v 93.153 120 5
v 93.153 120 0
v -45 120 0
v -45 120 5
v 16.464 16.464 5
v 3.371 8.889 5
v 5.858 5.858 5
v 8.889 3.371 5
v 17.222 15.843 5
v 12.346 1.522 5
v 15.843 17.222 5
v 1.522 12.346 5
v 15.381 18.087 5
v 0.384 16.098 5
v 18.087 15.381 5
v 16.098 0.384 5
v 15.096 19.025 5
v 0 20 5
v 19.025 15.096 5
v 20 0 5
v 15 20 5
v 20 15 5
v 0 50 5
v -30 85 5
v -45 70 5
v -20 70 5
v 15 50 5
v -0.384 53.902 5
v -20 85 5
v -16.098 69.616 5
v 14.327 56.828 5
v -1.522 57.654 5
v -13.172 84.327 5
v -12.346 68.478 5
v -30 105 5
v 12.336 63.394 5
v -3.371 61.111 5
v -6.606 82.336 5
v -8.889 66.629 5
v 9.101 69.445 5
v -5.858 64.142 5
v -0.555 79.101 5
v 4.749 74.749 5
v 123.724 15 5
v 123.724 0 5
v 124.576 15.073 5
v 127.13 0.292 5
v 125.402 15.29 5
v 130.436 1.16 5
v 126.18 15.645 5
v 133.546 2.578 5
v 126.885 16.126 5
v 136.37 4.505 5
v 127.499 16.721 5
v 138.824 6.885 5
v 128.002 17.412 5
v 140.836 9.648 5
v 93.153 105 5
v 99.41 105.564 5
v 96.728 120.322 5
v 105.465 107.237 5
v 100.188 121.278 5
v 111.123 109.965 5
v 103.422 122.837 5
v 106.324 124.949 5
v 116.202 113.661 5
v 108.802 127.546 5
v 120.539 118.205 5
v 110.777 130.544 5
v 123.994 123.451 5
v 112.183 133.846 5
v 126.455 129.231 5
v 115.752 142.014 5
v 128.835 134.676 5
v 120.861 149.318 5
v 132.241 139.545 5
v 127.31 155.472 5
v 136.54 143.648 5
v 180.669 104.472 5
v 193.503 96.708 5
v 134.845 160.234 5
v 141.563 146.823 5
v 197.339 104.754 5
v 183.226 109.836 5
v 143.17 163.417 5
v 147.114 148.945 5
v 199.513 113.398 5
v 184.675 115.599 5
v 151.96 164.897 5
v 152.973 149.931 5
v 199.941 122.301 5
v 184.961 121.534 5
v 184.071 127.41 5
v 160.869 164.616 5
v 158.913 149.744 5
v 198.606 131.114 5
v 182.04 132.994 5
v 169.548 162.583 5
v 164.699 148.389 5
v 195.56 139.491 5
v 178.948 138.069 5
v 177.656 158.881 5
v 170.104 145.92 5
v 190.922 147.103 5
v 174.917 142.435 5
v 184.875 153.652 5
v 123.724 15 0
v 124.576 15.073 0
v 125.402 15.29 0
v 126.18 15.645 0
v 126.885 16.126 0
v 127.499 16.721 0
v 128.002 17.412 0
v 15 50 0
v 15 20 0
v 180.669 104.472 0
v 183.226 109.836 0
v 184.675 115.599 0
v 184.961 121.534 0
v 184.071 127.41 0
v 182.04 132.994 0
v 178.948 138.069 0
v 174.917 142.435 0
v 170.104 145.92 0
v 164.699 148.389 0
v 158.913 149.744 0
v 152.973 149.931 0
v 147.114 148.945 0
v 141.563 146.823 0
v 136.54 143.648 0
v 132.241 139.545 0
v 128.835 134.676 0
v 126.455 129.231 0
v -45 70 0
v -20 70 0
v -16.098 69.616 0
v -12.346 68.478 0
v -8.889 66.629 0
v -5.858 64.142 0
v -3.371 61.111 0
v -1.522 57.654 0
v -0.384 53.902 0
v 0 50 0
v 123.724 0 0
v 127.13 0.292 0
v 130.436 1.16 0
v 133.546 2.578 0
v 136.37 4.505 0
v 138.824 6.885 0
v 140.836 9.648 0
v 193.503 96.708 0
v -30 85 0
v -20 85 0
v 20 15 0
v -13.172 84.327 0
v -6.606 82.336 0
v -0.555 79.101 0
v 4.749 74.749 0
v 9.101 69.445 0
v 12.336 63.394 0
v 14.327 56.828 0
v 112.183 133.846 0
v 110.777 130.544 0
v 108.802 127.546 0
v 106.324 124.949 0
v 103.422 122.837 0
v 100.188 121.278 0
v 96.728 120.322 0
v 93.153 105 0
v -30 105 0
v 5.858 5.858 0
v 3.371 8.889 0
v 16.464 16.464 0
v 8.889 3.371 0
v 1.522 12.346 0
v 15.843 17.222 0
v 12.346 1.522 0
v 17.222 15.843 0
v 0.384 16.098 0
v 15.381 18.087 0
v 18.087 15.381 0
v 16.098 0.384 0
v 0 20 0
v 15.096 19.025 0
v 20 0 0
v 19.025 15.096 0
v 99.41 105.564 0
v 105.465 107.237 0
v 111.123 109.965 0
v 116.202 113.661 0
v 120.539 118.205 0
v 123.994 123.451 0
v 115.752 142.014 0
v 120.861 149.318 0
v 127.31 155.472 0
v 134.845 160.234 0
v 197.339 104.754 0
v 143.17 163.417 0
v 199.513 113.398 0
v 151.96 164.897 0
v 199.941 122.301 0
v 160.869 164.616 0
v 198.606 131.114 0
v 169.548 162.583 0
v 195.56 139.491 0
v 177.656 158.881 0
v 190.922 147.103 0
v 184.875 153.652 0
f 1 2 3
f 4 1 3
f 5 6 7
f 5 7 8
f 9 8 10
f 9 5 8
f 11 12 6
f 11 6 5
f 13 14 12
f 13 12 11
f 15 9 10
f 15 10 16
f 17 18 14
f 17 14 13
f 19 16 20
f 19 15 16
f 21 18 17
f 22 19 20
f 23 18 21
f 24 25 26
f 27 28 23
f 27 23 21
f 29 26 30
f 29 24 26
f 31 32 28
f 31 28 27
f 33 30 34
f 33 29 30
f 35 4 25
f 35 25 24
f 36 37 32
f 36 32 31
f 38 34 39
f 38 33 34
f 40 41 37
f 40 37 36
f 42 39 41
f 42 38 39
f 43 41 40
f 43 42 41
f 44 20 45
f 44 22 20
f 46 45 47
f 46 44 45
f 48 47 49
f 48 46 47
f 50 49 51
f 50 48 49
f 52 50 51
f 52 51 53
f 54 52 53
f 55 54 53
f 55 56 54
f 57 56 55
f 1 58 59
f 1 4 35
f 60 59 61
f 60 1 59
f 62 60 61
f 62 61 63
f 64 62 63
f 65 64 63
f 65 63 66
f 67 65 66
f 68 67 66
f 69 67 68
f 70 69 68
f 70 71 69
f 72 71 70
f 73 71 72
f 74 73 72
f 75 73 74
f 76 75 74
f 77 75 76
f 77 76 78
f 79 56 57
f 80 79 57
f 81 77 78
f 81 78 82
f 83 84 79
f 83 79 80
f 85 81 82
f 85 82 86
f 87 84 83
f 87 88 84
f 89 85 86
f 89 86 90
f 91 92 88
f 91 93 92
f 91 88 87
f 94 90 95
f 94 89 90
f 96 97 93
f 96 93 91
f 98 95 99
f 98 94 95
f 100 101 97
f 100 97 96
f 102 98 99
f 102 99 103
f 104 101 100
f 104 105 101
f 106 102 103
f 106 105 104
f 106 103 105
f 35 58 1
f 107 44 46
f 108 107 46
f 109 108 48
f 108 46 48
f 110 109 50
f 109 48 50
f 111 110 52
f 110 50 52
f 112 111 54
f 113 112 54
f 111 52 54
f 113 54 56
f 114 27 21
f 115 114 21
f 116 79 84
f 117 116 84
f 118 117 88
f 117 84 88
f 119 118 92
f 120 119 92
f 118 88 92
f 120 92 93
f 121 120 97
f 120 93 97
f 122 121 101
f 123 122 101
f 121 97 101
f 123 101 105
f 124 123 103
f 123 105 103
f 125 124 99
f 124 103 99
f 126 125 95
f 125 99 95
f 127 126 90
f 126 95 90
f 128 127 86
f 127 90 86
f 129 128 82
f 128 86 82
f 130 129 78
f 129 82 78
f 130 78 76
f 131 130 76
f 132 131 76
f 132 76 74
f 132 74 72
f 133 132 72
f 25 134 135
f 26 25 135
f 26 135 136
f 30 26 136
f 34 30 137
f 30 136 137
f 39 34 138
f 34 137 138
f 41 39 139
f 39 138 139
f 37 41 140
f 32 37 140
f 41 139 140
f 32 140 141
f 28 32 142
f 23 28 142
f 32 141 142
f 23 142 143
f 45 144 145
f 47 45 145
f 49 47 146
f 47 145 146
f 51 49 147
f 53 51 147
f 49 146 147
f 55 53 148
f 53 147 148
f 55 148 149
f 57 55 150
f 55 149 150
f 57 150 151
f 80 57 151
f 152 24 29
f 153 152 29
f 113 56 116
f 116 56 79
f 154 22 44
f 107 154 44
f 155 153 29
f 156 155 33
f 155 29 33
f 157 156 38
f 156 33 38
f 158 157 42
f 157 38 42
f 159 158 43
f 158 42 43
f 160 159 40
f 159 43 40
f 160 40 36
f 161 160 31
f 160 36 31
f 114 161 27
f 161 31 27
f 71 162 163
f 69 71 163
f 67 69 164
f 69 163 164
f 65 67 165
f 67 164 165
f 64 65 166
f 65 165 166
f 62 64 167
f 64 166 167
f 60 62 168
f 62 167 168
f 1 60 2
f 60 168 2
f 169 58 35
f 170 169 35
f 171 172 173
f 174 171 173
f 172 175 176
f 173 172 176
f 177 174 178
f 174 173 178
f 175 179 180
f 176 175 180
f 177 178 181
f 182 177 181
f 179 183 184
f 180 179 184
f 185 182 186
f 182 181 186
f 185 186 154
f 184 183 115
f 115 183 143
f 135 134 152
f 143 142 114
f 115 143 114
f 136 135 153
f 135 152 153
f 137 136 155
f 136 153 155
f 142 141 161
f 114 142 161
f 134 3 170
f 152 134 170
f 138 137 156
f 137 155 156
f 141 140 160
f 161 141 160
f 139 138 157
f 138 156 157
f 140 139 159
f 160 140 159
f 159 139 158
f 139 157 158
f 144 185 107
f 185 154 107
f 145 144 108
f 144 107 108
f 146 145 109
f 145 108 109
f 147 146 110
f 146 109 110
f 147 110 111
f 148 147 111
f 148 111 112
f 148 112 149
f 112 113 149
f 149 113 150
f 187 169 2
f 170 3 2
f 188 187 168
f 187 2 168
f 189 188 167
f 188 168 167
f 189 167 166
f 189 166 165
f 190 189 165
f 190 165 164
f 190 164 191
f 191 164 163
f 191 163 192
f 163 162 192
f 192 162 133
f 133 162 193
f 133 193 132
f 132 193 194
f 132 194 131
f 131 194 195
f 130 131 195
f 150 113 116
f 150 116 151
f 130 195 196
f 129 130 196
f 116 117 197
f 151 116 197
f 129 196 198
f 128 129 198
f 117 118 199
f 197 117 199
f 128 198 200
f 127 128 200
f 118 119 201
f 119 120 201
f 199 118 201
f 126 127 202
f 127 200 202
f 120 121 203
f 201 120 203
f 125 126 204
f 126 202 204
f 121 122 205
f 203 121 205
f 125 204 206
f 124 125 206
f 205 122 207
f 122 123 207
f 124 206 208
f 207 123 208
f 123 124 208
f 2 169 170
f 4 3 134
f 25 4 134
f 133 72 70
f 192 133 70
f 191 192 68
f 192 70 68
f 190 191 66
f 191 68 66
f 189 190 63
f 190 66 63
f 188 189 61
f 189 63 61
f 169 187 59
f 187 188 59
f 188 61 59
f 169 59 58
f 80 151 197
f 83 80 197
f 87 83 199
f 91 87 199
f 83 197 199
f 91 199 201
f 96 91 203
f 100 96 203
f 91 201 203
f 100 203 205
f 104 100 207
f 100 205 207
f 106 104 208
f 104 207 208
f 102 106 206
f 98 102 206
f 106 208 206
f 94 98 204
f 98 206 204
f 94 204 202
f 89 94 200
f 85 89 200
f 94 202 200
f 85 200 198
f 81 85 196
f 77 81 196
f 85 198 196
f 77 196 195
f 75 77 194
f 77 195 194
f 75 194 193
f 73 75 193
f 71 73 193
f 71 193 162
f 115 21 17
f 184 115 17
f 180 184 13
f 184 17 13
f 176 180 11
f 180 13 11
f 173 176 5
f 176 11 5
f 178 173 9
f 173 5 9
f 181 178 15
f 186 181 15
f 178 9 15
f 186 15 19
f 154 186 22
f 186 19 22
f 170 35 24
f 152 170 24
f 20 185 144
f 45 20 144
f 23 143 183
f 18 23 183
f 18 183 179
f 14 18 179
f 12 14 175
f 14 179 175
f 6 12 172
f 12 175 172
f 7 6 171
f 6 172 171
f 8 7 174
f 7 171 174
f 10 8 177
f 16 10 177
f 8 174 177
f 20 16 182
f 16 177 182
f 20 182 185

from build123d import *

# Parameters (mm, degrees)
BASE_DEPTH         = 5
CUT_EXTRUDE1_DEPTH = 260.326049598


with BuildPart() as part:
    # Sketch1 → base (new body)
    with BuildSketch(Plane.XY):
        with BuildLine():
            Line((-45, 120), (-45, 70))
            Line((-45, 70), (-20, 70))
            ThreePointArc((-20, 70), (-5.857864376, 64.142135624), (0, 50))
            Line((0, 50), (0, 20))
            ThreePointArc((0, 20), (5.857864376, 5.857864376), (20, 0))
            Line((20, 0), (123.724055084, 0))
            ThreePointArc((123.724055084, 0), (133.546443389, 2.578154863), (140.836467877, 9.647931201))
            Line((140.836467877, 9.647931201), (193.502928783, 96.707845203))
            ThreePointArc((193.502928783, 96.707845203), (173.694009897, 160.933287114), (112.183133888, 133.846153846))
            ThreePointArc((112.183133888, 133.846153846), (104.920383724, 123.827849199), (93.153415616, 120))
            Line((93.153415616, 120), (-45, 120))
        make_face()
    extrude(amount=BASE_DEPTH)

    # Sketch2 → Cut-Extrude1 (cut, through all)
    with BuildSketch(Plane.XY.offset(5)):
        with BuildLine():
            Line((93.153415616, 105), (-30, 105))
            Line((-30, 105), (-30, 85))
            Line((-30, 85), (-20, 85))
            ThreePointArc((-20, 85), (4.748737342, 74.748737342), (15, 50))
            Line((15, 50), (15, 20))
            ThreePointArc((15, 20), (16.464466094, 16.464466094), (20, 15))
            Line((20, 15), (123.724055084, 15))
            ThreePointArc((123.724055084, 15), (126.179652161, 15.644538716), (128.002158282, 17.4119828))
            Line((128.002158282, 17.4119828), (180.668619189, 104.471896802))
            ThreePointArc((180.668619189, 104.471896802), (167.462673265, 147.288858076), (126.455422592, 129.230769231))
            ThreePointArc((126.455422592, 129.230769231), (113.745609805, 111.698736098), (93.153415616, 105))
        make_face()
    extrude(amount=-CUT_EXTRUDE1_DEPTH, mode=Mode.SUBTRACT)


solid = part.part
